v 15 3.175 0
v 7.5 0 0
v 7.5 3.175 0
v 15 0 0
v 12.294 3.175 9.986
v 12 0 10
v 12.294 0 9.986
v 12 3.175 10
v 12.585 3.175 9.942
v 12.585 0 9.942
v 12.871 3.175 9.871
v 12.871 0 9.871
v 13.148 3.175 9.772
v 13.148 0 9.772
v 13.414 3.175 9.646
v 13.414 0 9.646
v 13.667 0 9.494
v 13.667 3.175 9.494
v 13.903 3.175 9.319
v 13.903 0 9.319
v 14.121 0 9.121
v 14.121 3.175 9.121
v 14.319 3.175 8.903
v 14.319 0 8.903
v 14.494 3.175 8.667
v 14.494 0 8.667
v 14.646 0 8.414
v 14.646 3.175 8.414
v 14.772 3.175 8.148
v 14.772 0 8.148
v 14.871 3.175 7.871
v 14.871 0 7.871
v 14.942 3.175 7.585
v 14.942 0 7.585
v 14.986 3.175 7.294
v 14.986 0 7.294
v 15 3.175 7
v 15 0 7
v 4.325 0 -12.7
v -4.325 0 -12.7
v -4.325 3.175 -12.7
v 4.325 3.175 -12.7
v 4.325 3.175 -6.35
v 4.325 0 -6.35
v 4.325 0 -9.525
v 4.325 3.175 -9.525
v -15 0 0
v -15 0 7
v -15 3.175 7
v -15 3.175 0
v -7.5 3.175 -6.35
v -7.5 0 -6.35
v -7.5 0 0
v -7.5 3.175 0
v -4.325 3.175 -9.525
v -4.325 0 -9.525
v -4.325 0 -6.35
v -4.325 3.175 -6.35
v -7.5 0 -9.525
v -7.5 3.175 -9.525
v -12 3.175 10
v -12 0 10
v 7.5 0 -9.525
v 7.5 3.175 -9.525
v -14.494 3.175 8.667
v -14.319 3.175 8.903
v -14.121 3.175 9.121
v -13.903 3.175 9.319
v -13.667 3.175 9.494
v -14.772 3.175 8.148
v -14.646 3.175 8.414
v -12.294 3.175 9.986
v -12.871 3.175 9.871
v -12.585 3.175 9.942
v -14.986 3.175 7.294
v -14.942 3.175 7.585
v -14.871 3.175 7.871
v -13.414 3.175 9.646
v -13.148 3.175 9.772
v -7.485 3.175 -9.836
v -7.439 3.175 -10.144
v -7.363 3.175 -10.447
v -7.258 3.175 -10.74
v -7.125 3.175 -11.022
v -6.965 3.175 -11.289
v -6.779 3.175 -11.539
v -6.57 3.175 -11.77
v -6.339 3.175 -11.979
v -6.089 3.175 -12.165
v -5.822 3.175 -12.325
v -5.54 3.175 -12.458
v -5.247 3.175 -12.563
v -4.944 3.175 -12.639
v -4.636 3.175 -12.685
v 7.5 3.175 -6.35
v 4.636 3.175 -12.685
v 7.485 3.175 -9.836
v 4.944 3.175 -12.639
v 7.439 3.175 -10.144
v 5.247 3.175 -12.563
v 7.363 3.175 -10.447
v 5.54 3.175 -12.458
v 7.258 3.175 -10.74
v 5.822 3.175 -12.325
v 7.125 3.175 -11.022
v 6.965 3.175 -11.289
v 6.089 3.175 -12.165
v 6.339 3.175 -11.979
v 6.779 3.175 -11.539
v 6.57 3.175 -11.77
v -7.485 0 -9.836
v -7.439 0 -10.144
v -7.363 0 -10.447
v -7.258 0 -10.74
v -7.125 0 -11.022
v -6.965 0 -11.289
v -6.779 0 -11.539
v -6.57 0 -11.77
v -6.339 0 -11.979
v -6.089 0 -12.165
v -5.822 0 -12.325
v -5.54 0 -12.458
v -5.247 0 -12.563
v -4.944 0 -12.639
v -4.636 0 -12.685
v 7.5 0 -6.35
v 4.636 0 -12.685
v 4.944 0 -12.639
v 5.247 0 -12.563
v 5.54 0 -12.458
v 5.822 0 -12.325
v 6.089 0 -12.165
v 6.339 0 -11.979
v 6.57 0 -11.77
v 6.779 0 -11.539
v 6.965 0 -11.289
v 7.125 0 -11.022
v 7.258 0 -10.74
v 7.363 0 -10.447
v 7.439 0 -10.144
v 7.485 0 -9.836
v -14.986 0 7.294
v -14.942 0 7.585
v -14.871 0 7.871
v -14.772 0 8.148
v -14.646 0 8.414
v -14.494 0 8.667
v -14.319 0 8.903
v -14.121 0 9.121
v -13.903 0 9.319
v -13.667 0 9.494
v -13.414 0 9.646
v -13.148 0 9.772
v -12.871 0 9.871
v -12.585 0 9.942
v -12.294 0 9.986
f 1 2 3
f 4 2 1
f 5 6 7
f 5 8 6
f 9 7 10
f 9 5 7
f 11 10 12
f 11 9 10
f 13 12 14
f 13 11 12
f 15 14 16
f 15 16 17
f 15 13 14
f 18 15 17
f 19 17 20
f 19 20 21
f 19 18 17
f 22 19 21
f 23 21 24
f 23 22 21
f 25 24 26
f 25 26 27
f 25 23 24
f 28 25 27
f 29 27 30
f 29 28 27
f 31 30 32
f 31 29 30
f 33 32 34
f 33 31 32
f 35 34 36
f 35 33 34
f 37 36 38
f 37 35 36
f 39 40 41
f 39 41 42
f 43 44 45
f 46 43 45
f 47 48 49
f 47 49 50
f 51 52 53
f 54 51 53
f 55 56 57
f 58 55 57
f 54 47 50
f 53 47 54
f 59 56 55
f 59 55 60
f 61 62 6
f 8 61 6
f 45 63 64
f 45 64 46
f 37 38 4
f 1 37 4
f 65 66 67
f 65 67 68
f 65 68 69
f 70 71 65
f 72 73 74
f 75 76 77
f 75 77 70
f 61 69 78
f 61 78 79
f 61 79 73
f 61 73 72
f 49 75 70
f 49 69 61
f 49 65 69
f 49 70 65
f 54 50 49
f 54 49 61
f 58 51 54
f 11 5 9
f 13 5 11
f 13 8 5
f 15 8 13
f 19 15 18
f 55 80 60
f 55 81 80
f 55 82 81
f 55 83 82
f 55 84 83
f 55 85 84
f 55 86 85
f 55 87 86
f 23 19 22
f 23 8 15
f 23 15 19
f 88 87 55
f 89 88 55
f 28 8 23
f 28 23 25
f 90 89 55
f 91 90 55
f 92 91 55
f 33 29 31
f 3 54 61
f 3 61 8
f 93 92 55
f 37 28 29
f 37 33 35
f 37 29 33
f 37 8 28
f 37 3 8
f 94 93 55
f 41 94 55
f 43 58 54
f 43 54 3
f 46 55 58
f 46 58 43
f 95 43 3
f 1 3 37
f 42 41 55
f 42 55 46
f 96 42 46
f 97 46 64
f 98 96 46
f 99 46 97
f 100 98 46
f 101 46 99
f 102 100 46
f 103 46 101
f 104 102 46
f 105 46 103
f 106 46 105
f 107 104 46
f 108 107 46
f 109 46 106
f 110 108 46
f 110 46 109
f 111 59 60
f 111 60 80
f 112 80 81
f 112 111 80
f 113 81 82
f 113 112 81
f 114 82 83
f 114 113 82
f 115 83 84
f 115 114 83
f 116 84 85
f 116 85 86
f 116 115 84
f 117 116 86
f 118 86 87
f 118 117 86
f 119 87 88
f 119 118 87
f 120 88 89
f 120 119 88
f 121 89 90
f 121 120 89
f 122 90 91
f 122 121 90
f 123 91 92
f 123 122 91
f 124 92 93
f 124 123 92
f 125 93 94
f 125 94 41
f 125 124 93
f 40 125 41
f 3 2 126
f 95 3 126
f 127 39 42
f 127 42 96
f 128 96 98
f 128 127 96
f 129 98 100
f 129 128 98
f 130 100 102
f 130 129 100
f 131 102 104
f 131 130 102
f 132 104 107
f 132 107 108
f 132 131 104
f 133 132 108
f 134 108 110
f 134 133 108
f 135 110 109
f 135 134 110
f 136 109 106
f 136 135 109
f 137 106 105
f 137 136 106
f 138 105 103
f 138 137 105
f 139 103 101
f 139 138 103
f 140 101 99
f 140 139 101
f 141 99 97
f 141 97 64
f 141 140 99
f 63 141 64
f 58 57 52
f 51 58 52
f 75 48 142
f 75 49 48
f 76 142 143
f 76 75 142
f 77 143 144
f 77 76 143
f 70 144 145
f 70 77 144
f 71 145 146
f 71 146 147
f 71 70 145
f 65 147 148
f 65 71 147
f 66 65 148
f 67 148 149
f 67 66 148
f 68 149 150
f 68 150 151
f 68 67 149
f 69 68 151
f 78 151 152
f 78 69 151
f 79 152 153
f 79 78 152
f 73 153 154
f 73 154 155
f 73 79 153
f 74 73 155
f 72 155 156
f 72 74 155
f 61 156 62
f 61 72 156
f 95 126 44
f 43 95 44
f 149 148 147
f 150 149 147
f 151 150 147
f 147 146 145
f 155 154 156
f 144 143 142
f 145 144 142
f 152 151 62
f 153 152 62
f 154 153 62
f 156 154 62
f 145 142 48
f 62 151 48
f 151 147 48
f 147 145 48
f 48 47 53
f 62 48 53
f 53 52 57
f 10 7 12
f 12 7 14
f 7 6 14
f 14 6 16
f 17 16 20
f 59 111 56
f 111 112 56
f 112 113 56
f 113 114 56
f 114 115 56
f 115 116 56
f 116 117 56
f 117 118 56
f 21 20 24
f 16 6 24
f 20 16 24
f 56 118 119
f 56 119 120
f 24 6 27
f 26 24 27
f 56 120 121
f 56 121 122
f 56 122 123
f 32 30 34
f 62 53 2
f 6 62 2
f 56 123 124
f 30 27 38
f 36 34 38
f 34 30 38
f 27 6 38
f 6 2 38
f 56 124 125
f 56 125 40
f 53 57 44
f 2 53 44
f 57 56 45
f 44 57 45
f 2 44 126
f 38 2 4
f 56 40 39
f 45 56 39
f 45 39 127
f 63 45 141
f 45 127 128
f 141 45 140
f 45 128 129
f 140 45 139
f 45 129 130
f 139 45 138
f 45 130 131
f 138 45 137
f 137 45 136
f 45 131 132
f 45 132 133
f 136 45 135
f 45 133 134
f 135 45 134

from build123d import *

# Parameters (mm, degrees)
SKETCH1_W           = 30
SKETCH1_H           = 10
BOSS_EXTRUDE2_DEPTH = 3.175
FILLET3_R           = 3


with BuildPart() as part:
    # Sketch1 → Boss-Extrude2 (new body)
    with BuildSketch(Plane(origin=(0, 0, 0), x_dir=(1, 0, 0), z_dir=(0, 1, 0))):
        with Locations((0, -5)):
            Rectangle(SKETCH1_W, SKETCH1_H)
        Polygon((-7.5, 3.175), (-7.5, 0), (7.5, 0), (7.5, 3.175), (7.5, 6.35), (4.325, 6.35), (-3.85, 6.35), (-4.325, 6.35), (-7.5, 6.35), align=None)
        Polygon((-4.325, 9.525), (-4.325, 6.35), (-3.85, 6.35), (4.325, 6.35), (4.325, 9.525), align=None)
        with BuildLine():
            ThreePointArc((-7.5, 9.525), (-6.57006403, 11.77006403), (-4.325, 12.7))
            Line((-4.325, 12.7), (4.325, 12.7))
            ThreePointArc((4.325, 12.7), (6.57006403, 11.77006403), (7.5, 9.525))
            Line((7.5, 9.525), (4.325, 9.525))
            Line((4.325, 9.525), (-4.325, 9.525))
            Line((-4.325, 9.525), (-7.5, 9.525))
        make_face()
    extrude(amount=BOSS_EXTRUDE2_DEPTH)

    # Fillet3
    fillet3_edges = [part.edges().sort_by_distance(p)[0] for p in [
        (15, 1.5875, 10),
        (-15, 1.5875, 10),
    ]]
    fillet(fillet3_edges, radius=FILLET3_R)


solid = part.part
